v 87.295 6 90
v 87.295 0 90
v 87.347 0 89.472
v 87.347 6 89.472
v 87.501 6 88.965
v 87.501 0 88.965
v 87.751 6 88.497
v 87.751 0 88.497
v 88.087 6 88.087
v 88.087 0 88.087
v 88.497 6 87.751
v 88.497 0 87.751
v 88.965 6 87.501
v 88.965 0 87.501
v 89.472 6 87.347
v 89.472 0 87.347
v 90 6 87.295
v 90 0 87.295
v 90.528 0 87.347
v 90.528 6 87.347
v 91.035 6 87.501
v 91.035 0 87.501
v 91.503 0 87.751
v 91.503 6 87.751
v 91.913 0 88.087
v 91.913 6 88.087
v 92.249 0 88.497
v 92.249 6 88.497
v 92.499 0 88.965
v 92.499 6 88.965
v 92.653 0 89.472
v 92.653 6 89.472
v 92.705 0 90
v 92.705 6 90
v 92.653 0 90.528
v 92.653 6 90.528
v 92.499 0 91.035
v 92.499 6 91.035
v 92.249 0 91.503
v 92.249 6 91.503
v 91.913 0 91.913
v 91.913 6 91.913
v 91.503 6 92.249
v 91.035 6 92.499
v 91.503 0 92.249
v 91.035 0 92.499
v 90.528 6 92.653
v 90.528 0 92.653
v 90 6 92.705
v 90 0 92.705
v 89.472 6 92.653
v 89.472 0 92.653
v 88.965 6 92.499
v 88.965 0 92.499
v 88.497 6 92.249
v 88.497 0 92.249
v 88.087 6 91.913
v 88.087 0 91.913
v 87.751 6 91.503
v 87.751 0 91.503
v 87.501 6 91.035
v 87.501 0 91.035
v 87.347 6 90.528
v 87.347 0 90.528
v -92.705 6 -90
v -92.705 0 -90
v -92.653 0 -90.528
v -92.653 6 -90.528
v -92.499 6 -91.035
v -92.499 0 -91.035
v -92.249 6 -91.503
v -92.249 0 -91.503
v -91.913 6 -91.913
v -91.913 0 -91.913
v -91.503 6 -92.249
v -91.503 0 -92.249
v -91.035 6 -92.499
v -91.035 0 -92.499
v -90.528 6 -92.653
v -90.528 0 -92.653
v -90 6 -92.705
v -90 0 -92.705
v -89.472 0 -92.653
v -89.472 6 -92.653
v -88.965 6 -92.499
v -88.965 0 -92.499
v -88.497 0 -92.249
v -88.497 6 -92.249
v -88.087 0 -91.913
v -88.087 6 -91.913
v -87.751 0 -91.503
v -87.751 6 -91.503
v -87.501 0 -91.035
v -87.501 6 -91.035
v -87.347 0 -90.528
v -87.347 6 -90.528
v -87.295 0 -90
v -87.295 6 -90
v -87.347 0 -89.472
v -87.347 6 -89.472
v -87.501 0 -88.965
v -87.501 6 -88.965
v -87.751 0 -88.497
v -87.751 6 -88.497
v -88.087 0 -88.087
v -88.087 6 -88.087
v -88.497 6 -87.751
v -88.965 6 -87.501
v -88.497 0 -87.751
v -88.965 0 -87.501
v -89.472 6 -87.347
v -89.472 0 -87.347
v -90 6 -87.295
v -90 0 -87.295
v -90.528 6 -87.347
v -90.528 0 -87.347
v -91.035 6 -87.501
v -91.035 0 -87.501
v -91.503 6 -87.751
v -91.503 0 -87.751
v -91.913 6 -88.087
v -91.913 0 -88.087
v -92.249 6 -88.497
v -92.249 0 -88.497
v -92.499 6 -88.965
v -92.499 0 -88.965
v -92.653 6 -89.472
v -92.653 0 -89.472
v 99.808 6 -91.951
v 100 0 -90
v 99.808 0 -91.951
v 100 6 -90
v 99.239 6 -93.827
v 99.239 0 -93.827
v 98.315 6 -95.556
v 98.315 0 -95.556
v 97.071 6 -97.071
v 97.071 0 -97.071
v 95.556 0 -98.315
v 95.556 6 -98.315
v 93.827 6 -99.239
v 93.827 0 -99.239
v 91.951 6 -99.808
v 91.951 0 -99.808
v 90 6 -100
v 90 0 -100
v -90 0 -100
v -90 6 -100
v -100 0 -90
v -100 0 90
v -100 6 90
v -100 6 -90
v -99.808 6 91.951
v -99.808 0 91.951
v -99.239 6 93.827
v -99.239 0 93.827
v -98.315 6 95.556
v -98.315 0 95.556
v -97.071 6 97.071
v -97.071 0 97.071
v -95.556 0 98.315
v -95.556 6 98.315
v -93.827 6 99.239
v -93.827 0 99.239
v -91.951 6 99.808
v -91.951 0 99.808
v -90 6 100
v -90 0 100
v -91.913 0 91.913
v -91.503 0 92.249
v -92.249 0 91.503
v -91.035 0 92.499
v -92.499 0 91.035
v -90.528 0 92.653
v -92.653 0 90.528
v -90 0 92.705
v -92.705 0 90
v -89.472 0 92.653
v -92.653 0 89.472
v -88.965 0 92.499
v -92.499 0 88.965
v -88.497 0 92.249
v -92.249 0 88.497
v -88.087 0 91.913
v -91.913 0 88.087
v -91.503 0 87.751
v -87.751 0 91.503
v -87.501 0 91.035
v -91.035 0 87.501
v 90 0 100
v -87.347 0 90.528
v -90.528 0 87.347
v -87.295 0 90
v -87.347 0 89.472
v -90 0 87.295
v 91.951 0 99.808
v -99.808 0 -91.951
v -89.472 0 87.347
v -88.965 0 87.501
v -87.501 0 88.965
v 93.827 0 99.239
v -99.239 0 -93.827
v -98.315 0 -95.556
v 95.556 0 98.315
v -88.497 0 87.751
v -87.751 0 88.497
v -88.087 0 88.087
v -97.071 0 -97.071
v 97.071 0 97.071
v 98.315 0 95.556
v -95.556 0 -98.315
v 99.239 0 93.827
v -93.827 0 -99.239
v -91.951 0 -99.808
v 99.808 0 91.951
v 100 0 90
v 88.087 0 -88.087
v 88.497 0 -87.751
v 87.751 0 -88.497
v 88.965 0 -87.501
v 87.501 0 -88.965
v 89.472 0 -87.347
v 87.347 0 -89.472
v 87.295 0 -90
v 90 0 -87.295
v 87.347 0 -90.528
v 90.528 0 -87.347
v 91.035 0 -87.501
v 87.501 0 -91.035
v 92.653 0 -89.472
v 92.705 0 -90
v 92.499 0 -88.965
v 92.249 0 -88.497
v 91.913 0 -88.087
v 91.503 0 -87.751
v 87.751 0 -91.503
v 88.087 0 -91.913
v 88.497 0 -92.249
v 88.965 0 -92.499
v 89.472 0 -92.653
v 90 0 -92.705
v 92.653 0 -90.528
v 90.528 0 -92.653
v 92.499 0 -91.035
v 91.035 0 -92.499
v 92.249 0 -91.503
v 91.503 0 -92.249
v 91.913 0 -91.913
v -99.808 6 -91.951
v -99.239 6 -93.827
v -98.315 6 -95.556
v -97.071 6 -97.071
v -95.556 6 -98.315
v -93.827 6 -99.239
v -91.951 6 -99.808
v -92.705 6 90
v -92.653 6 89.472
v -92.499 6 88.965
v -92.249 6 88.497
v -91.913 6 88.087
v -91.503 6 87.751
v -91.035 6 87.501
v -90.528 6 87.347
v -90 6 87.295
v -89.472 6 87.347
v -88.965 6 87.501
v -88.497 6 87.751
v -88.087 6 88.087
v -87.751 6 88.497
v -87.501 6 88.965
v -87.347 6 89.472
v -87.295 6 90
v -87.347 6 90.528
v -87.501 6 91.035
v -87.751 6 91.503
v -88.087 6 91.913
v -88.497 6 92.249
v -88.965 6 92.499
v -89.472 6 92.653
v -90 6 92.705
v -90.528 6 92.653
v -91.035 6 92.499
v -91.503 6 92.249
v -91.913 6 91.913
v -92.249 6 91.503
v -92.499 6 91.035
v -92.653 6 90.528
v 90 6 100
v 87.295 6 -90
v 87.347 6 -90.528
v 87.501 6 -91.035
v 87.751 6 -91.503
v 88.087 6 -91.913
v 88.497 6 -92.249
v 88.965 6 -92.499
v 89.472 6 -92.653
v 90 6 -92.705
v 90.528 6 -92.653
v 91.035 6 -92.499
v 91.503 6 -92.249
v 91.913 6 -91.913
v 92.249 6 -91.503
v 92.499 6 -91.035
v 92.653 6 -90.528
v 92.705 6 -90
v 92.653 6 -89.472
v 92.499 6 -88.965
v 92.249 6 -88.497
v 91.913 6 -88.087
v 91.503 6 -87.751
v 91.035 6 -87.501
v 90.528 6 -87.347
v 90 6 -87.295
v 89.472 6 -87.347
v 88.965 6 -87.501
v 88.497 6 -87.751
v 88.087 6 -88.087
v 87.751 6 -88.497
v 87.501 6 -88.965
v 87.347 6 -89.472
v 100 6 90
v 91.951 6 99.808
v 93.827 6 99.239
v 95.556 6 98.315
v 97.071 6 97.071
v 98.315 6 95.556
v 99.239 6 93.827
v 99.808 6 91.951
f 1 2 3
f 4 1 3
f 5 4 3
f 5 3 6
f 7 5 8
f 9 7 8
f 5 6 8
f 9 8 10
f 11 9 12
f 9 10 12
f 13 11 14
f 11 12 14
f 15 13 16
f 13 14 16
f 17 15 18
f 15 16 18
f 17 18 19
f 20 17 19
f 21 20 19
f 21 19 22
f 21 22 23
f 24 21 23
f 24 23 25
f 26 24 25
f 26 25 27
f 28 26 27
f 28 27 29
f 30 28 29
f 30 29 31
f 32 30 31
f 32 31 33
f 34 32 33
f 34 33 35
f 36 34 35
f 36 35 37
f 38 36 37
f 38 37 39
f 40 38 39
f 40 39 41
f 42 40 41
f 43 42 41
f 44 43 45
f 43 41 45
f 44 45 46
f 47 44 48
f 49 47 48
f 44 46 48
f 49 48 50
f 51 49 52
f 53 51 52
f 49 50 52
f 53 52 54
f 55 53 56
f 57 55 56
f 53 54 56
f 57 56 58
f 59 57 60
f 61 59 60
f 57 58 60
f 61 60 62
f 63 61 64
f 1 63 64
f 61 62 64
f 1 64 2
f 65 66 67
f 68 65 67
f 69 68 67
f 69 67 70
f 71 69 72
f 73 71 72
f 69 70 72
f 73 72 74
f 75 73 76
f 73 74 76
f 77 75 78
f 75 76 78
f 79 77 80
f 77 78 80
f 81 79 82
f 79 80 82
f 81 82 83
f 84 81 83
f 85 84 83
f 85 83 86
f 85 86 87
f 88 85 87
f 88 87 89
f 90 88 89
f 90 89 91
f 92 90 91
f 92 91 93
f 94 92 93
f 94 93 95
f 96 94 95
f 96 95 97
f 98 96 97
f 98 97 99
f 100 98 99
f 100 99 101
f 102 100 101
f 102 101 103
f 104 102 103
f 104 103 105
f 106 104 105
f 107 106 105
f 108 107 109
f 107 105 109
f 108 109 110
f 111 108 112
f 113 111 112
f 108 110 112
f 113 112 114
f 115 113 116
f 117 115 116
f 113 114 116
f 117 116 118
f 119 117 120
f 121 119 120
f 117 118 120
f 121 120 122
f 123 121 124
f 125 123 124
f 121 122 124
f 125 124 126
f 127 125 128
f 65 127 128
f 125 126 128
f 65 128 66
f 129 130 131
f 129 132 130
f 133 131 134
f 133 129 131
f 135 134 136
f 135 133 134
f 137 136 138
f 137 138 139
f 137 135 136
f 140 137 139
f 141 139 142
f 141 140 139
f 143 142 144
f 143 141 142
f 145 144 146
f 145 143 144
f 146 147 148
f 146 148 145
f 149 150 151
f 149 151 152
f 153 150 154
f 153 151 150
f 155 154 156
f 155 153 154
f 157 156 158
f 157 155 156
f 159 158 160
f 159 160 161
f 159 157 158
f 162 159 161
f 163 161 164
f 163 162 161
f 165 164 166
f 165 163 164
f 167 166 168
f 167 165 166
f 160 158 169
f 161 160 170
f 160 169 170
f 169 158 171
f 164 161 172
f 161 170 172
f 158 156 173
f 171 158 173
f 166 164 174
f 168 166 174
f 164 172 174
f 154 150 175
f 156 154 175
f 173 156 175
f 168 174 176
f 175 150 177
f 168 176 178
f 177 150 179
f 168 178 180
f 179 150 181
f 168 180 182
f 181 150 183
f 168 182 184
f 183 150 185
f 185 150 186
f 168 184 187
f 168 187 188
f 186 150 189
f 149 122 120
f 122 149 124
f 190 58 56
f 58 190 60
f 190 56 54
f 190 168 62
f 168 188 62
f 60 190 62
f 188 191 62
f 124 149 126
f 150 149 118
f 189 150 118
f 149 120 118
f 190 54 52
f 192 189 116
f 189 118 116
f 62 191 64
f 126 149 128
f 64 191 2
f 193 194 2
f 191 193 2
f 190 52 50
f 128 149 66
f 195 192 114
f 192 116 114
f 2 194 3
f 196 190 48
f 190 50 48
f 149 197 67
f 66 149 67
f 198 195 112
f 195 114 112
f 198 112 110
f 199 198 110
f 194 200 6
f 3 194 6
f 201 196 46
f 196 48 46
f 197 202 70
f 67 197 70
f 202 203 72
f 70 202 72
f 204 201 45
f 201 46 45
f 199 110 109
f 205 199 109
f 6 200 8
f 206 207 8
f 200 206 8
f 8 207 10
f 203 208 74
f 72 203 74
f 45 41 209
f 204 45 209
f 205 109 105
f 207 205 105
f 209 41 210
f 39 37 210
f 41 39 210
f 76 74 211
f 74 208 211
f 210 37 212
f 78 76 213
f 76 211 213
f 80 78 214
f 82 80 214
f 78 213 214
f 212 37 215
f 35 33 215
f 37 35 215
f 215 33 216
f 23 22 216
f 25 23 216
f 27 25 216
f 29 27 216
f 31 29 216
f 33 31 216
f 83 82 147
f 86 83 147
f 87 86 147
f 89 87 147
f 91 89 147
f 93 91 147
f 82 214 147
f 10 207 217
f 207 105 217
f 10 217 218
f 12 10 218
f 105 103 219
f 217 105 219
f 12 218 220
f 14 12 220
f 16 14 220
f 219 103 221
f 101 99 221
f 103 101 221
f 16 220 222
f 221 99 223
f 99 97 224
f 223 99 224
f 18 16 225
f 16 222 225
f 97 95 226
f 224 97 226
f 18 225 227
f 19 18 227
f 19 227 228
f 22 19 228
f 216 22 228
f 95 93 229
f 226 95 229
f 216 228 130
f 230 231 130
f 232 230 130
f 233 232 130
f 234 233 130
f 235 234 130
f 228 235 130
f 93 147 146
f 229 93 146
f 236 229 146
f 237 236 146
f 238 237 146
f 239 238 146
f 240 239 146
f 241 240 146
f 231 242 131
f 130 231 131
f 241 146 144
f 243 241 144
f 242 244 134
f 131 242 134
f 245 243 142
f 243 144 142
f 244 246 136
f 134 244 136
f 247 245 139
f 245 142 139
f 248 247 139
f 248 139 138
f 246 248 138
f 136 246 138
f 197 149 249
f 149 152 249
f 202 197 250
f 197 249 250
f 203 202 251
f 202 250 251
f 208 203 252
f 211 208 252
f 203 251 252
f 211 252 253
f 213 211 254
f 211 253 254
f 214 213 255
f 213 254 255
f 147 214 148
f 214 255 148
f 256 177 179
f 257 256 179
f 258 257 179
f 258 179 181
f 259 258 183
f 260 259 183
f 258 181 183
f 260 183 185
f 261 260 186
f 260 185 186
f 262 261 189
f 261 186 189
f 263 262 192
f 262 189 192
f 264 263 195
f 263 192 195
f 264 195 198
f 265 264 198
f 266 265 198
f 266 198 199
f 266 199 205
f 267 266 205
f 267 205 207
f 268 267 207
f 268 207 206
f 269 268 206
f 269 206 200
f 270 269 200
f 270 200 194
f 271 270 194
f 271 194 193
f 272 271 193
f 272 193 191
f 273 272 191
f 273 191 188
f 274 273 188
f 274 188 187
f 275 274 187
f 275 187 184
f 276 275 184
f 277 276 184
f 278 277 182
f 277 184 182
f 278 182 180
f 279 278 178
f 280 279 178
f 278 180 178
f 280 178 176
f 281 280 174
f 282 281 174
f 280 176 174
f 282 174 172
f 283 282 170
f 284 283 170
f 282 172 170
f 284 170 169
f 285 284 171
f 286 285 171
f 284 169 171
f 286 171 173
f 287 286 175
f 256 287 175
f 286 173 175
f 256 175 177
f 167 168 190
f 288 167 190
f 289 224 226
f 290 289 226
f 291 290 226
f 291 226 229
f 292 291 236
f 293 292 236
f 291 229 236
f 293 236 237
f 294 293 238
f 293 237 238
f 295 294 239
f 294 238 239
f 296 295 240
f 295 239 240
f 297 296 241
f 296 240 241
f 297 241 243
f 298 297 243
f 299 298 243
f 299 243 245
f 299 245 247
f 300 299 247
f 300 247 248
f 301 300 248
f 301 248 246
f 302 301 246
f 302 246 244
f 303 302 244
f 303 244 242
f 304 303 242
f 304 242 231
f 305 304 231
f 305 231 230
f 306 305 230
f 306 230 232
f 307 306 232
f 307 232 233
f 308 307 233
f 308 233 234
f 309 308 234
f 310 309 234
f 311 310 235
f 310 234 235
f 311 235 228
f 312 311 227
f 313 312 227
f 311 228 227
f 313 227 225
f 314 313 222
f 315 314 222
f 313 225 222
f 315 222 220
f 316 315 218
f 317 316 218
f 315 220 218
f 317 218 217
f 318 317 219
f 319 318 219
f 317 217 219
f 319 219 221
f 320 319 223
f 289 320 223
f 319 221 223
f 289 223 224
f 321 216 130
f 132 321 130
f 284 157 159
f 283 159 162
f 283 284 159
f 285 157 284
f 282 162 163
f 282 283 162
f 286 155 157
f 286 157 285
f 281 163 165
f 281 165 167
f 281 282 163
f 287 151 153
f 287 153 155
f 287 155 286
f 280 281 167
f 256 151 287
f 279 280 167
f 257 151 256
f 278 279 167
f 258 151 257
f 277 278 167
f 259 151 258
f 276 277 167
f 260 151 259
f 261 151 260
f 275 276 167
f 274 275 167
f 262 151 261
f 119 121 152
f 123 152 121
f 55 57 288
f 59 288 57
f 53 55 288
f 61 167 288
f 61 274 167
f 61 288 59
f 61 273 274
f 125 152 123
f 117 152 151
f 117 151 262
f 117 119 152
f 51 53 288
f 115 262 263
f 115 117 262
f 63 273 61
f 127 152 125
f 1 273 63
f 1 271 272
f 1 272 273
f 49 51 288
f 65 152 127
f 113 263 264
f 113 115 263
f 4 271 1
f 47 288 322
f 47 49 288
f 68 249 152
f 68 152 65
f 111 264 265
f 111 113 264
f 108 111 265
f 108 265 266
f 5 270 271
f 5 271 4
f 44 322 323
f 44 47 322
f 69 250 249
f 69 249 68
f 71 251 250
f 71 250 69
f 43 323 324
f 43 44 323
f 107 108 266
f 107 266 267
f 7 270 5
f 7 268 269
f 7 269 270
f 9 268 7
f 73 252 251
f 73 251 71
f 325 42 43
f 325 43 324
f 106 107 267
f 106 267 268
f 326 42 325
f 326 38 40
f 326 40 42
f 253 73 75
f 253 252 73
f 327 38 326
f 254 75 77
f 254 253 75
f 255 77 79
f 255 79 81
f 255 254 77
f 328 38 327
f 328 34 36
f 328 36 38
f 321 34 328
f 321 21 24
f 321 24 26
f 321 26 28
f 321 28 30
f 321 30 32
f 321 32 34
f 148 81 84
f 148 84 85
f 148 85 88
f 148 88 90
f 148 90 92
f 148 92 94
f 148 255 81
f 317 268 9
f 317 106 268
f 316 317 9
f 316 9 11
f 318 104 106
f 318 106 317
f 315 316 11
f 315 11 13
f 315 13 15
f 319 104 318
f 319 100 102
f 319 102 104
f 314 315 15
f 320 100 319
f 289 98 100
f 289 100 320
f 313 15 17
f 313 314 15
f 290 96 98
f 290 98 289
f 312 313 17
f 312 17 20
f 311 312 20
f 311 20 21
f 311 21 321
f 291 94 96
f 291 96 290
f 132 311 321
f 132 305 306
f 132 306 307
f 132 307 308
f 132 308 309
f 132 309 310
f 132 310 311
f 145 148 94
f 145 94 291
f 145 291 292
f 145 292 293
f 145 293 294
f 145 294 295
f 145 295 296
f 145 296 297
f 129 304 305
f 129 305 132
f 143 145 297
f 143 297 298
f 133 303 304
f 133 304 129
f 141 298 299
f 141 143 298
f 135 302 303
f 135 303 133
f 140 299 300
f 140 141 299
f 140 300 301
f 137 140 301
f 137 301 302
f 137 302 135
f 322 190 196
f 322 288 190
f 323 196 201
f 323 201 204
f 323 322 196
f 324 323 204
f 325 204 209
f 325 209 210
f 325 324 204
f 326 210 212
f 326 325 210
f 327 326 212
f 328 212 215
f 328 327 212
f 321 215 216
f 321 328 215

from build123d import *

# Parameters (mm, degrees)
SKETCH1_W                   = 200
SKETCH1_H                   = 200
BOSS_EXTRUDE1_DEPTH         = 6
FILLET1_R                   = 10
TAP_DRILL_FOR_1_4_28_TAP1_D = 5.4102


with BuildPart() as part:
    # Sketch1 → Boss-Extrude1 (new body)
    with BuildSketch(Plane(origin=(0, 0, 0), x_dir=(1, 0, 0), z_dir=(0, 1, 0))):
        Rectangle(SKETCH1_W, SKETCH1_H)
    extrude(amount=BOSS_EXTRUDE1_DEPTH)

    # Fillet1
    fillet1_edges = [part.edges().sort_by_distance(p)[0] for p in [
        (100, 3, 100),
        (-100, 3, 100),
        (-100, 3, -100),
        (100, 3, -100),
    ]]
    fillet(fillet1_edges, radius=FILLET1_R)

    # Tap Drill for 1/4-28 Tap1 (through all)
    with Locations(Plane(origin=(0, 6, 0), x_dir=(1, 0, 0), z_dir=(0, 1, 0))):
        with Locations((-90, 90), (90, 90), (90, -90), (-90, -90)):
            Hole(TAP_DRILL_FOR_1_4_28_TAP1_D / 2)


solid = part.part
